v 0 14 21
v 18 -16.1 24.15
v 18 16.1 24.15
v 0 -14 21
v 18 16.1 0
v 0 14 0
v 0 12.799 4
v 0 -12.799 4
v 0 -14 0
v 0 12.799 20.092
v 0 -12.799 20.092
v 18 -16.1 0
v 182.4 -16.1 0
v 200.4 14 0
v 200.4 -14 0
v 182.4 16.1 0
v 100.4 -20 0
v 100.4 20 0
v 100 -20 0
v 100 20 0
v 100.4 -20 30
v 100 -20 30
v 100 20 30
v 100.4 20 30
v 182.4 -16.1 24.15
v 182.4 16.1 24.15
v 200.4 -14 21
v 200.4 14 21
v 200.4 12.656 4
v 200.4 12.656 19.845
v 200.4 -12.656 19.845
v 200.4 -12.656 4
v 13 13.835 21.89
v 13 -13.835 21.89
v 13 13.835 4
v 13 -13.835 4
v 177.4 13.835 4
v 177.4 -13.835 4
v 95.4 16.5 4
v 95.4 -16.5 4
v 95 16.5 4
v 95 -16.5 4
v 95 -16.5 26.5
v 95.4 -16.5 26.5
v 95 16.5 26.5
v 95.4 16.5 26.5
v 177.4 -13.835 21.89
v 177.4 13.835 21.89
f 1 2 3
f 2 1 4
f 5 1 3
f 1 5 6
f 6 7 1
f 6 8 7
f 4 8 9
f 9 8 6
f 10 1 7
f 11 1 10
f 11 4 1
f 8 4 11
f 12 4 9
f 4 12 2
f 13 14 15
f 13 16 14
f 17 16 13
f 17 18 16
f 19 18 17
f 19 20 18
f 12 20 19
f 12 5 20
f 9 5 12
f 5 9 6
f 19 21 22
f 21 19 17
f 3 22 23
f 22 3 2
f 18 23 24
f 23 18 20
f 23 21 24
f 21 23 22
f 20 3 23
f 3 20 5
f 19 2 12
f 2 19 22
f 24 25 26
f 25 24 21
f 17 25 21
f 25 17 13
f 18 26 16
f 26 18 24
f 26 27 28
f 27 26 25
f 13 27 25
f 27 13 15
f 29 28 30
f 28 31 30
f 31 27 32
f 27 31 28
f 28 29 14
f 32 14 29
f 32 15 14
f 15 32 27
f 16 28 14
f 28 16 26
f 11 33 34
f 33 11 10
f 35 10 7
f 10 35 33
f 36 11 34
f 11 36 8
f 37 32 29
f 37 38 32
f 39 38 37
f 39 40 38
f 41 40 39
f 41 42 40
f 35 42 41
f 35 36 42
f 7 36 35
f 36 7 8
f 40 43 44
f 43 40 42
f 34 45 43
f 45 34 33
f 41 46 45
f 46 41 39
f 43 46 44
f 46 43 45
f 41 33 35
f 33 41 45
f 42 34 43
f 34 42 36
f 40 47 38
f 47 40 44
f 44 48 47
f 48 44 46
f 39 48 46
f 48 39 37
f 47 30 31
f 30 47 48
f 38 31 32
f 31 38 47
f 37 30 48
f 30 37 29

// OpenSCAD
$fn = 32;

// ----------------------------------------------------------------------
// Faired channel: 200 x 40 x 30 mm, 3.5 mm walls, faired ends
// ----------------------------------------------------------------------

// --- parameters (mm) ---
length = 200;             // channel length
width = 40;               // channel width at mid length
height = 30;              // channel height at mid length
wall = 3.5;               // side wall thickness
floor_t = 4;              // floor thickness
end_w = 28;               // faired end width
end_h = 21;               // faired end height

difference() {
  union() {
    hull() {
      translate([0, -14, 0]) cube([0.4, 28, 21]);
      translate([18, -16.1, 0]) cube([0.4, 32.2, 24.15]);
    }
    hull() {
      translate([18, -16.1, 0]) cube([0.4, 32.2, 24.15]);
      translate([100, -20, 0]) cube([0.4, 40, 30]);
    }
    hull() {
      translate([100, -20, 0]) cube([0.4, 40, 30]);
      translate([182, -16.1, 0]) cube([0.4, 32.2, 24.15]);
    }
    hull() {
      translate([182, -16.1, 0]) cube([0.4, 32.2, 24.15]);
      translate([200, -14, 0]) cube([0.4, 28, 21]);
    }
  }
  /* cavity, 5 mm proud of both ends so the ports are cut clean */
  hull() {
    translate([-5, -12.4, 4]) cube([0.4, 24.8, 15.4]);
    translate([13, -13.835, 4]) cube([0.4, 27.67, 17.89]);
  }
  hull() {
    translate([13, -13.835, 4]) cube([0.4, 27.67, 17.89]);
    translate([95, -16.5, 4]) cube([0.4, 33, 22.5]);
  }
  hull() {
    translate([95, -16.5, 4]) cube([0.4, 33, 22.5]);
    translate([177, -13.835, 4]) cube([0.4, 27.67, 17.89]);
  }
  hull() {
    translate([177, -13.835, 4]) cube([0.4, 27.67, 17.89]);
    translate([205, -12.4, 4]) cube([0.4, 24.8, 15.4]);
  }
}
